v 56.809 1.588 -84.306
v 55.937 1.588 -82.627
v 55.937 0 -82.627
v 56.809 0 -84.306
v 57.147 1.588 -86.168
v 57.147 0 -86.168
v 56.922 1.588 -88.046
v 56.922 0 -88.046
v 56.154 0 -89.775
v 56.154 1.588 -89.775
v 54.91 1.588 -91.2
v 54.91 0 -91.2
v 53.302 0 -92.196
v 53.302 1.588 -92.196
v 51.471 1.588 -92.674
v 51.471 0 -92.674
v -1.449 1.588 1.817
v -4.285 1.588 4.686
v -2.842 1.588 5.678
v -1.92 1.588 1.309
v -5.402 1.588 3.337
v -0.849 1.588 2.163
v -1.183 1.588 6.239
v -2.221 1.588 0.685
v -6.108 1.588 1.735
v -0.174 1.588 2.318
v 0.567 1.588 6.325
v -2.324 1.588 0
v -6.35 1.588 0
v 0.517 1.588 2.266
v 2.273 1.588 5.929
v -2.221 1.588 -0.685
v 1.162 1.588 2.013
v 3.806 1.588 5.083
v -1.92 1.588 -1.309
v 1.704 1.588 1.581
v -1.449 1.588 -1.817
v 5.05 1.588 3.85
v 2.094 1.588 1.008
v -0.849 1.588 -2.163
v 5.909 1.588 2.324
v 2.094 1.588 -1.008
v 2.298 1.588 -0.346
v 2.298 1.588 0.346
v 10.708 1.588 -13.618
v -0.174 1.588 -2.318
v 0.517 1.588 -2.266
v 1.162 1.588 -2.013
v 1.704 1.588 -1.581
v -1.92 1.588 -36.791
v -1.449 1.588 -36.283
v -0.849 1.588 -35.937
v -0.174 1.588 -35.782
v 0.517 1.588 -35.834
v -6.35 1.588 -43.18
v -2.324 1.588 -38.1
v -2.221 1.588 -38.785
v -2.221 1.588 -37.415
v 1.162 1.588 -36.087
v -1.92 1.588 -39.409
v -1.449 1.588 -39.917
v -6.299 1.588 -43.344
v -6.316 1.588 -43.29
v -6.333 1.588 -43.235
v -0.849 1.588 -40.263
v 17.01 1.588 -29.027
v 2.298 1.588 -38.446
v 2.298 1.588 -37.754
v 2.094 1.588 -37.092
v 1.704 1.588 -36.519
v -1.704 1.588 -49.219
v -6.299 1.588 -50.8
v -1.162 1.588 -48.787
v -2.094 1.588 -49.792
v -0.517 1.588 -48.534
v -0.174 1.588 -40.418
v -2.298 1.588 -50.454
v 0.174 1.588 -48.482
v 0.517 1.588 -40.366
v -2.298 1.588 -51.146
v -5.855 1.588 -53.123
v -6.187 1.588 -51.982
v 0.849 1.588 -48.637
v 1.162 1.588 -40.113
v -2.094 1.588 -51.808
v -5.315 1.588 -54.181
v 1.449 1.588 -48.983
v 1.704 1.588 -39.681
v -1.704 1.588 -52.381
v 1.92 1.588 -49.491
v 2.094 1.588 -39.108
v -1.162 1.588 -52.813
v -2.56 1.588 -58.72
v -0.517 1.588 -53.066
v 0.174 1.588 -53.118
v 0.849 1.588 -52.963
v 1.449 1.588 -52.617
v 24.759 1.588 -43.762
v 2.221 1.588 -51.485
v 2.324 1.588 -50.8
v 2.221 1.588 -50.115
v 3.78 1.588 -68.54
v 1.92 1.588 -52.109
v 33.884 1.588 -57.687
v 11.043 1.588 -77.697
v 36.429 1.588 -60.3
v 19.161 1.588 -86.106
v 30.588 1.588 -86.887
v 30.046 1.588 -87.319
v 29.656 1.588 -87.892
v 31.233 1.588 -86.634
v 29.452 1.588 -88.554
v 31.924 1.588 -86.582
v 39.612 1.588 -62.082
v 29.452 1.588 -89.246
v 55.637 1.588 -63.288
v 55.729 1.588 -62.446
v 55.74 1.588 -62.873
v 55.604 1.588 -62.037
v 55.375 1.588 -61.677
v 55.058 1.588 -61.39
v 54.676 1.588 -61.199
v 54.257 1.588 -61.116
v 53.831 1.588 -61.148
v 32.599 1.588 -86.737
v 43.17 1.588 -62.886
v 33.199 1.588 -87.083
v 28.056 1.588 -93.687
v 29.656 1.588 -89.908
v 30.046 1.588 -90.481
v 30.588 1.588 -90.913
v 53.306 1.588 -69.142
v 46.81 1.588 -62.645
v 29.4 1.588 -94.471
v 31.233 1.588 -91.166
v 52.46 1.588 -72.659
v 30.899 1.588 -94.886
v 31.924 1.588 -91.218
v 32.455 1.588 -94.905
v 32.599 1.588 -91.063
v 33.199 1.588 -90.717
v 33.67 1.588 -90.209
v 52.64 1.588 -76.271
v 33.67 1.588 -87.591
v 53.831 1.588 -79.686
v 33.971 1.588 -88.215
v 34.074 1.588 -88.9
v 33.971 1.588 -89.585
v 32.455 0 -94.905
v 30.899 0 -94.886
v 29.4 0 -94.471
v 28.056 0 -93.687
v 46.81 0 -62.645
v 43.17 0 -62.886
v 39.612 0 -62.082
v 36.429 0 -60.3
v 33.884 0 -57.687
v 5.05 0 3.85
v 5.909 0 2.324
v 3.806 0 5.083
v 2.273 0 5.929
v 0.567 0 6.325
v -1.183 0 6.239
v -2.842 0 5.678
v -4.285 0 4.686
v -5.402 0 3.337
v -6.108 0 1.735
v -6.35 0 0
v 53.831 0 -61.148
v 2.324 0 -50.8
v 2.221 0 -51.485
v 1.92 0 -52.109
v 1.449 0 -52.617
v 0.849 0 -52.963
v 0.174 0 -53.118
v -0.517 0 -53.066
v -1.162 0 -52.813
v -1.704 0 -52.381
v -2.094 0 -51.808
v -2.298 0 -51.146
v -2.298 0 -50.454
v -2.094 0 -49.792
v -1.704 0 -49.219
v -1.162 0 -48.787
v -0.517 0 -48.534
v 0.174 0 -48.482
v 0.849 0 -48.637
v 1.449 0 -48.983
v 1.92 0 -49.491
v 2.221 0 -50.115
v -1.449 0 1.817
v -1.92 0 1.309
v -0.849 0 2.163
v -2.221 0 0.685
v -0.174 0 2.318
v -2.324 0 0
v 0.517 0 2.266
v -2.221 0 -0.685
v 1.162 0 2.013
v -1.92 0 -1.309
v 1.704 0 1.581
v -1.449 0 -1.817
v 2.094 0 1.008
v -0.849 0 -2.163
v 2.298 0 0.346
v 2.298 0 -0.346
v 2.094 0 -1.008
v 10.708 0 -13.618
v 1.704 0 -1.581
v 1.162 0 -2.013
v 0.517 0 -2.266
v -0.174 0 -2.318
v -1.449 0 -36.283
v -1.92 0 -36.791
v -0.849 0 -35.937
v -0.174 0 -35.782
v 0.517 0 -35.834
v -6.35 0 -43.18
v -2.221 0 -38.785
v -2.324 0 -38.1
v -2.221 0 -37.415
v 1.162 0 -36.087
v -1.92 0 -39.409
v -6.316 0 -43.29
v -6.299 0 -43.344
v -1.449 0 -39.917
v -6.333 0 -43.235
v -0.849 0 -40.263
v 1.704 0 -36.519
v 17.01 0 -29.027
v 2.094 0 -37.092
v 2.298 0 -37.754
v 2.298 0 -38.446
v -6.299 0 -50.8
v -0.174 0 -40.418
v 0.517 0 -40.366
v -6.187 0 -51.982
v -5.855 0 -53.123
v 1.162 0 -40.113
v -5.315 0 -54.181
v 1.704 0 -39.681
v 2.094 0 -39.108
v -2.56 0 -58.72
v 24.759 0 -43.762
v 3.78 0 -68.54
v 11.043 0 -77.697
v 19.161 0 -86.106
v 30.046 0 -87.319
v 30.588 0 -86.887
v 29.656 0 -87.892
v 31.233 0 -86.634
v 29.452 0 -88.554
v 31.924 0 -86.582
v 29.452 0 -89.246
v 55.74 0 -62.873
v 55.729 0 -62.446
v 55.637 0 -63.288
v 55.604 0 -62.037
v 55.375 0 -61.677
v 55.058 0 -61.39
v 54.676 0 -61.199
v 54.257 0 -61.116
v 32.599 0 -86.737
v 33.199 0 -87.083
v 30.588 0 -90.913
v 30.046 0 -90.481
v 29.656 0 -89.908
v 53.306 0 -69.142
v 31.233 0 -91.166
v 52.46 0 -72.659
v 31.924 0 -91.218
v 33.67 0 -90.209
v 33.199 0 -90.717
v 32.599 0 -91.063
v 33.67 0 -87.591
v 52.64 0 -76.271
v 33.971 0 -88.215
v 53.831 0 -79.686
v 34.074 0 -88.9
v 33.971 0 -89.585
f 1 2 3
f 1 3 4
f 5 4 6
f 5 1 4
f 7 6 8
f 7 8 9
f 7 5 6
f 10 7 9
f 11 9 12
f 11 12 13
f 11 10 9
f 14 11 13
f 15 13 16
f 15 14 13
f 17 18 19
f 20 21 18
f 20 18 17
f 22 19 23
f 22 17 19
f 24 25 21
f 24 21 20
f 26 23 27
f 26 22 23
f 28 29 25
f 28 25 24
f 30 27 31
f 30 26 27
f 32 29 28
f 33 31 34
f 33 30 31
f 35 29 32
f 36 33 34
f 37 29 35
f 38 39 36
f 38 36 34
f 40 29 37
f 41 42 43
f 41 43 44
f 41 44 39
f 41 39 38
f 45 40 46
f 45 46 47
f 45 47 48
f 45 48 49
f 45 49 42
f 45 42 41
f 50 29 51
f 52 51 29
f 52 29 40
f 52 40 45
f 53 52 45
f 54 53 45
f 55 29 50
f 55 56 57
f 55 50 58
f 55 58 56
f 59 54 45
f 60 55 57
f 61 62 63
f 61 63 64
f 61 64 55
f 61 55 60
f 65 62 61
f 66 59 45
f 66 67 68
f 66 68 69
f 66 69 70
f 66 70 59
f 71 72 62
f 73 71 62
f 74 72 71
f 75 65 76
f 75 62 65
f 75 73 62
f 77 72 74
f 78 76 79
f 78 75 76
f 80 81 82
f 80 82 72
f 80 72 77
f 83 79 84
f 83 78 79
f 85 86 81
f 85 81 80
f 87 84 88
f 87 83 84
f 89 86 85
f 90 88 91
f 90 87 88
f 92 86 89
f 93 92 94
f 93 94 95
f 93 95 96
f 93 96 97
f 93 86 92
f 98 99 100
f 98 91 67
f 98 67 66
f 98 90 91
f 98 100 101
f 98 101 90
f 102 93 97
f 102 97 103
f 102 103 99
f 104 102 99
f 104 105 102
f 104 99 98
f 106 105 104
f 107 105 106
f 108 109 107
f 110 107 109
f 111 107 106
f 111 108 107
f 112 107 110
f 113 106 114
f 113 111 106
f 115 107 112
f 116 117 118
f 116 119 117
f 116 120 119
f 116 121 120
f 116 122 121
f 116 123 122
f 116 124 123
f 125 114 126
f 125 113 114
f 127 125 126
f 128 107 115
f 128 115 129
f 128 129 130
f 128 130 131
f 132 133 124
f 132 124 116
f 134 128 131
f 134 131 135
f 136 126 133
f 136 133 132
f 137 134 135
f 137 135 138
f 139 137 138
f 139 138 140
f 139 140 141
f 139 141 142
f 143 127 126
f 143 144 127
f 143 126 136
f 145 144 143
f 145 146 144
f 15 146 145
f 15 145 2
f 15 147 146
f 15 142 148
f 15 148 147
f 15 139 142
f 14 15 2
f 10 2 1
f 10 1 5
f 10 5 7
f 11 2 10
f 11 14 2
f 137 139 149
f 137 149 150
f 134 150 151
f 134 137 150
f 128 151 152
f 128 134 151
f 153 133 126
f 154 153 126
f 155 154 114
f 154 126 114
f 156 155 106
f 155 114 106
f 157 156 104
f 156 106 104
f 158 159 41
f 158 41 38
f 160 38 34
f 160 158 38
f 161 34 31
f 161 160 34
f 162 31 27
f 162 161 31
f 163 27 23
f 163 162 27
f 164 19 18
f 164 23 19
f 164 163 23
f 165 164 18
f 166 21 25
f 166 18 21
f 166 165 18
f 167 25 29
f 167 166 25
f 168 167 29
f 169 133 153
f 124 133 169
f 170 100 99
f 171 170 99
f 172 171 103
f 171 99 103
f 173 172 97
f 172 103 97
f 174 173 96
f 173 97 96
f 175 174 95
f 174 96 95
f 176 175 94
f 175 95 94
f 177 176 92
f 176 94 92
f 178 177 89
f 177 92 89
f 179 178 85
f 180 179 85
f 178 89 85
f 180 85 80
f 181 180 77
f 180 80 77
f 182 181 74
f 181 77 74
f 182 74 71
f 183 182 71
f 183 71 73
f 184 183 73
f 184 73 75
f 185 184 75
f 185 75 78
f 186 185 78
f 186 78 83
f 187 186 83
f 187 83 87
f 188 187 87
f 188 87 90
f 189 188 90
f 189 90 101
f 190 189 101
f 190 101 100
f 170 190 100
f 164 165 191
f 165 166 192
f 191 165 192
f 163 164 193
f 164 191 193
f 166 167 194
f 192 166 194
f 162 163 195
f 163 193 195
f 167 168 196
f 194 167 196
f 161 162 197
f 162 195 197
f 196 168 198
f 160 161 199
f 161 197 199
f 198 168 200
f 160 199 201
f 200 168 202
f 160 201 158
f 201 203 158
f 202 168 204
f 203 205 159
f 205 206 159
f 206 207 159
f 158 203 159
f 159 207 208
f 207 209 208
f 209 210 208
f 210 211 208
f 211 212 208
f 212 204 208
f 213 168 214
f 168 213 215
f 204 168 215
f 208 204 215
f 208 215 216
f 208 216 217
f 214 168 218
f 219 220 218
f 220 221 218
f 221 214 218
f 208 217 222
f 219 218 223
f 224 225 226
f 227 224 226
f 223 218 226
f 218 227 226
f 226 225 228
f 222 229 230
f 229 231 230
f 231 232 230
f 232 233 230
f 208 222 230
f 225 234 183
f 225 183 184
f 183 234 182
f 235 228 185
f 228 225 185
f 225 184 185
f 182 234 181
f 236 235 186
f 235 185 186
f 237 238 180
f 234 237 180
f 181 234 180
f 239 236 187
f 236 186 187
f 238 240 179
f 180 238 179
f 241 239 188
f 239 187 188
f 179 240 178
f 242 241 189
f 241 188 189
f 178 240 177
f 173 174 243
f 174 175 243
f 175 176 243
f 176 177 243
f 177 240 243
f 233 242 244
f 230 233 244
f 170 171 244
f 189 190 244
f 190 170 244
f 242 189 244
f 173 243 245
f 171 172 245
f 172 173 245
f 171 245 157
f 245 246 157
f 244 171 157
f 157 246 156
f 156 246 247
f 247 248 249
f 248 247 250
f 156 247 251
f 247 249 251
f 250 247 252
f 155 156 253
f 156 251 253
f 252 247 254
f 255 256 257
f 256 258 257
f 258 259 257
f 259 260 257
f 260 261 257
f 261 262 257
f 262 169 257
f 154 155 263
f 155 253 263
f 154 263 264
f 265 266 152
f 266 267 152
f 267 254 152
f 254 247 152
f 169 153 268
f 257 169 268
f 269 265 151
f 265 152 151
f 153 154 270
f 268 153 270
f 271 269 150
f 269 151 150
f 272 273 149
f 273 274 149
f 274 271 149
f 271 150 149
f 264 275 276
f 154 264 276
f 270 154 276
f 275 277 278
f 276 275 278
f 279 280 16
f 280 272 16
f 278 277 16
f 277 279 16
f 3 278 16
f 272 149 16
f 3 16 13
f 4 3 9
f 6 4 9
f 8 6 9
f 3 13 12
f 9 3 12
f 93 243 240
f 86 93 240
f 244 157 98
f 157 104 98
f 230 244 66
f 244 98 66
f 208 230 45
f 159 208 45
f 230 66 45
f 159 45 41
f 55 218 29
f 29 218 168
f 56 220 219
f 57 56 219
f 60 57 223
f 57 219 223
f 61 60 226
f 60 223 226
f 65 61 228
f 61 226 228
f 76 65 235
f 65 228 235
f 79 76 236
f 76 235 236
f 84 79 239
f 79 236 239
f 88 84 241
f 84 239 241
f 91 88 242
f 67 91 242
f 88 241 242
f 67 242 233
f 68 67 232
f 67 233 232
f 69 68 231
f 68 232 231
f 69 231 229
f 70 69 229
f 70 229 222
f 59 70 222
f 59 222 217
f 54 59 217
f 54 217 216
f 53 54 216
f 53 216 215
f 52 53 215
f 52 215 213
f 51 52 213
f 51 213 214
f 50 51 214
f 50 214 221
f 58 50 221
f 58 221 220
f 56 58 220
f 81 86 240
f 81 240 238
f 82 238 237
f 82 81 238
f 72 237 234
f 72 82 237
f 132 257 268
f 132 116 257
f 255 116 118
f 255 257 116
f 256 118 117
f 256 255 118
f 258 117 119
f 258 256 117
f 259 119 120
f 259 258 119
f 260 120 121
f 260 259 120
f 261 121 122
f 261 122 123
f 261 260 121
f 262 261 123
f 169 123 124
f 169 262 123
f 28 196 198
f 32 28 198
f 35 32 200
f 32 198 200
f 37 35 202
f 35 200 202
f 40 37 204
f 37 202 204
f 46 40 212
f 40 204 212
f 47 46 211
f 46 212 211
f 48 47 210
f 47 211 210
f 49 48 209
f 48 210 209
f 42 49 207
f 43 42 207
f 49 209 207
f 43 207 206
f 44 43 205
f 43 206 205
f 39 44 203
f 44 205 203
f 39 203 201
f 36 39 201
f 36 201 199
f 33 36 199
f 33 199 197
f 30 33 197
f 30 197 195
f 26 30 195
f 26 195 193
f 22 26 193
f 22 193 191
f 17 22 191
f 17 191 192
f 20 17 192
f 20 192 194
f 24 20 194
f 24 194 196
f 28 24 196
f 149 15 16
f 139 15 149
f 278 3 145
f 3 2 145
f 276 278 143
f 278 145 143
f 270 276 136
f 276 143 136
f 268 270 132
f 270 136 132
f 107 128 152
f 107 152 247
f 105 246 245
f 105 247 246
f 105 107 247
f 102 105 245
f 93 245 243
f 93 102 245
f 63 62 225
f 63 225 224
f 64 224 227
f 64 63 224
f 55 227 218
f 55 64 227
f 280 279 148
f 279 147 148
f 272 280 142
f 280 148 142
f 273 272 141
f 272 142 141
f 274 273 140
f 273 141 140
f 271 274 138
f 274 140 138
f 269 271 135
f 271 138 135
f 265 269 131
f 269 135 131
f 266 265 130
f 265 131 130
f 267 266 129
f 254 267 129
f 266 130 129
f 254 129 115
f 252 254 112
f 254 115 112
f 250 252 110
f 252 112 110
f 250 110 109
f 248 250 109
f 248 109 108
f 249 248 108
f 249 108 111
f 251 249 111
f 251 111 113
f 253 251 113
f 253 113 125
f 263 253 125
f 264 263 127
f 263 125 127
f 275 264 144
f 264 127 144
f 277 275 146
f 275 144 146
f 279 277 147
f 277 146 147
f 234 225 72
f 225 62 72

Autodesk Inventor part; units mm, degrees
ref_plane "YZ Plane" through (0, 0, 0) normal (1, 0, 0) x (0, 1, 0)
ref_plane "XZ Plane" through (0, 0, 0) normal (0, 1, 0) x (-1, 0, 0)
ref_plane "XY Plane" through (0, 0, 0) normal (0, 0, 1) x (1, 0, 0)
sketch "Sketch1" plane through (0, 0, 0) normal (0, 1, 0) x (-1, 0, 0)
  circle A0 centre (0, 0) radius 2.3241
  line L0 (0, 0) -> (0, -38.1)
  circle A1 centre (0, -38.1) radius 2.3241
  line L1 (0, 0) -> (0, -38.1) construction
  line L2 (-6.35, 0) -> (-6.35, -38.1)
  line L3 (6.35, -38.1) -> (6.35, 0)
  arc A2 (6.35, 0) -> (-6.35, 0) centre (0, 0) ccw
  arc A3 (-6.35, -38.1) -> (6.35, -38.1) centre (0, -38.1) ccw
  line L4 (0, -38.1) -> (-15.9411, -38.1) construction
  line L5 (0, -31.75) -> (-15.9411, -31.75)
  line L6 (-15.9411, -44.45) -> (0, -44.45)
  arc A4 (0, -44.45) -> (0, -31.75) centre (0, -38.1) ccw
  arc A5 (-15.9411, -31.75) -> (-15.9411, -44.45) centre (-15.9411, -38.1) ccw
  line L7 (-5.9094, 2.3241) -> (-21.799, -35.6488)
  point P0 (0, -19.05)
  point P1 (-7.9706, -38.1)
  dimension "d0" = 4.6482
  dimension "d1" = 38.1
  dimension "d2" = 4.6482
  dimension "d3" = 12.7
extrude "Extrusion1" add sketch "Sketch1" along normal blind 1.5875
sketch "Sketch2" plane through (0, 1.5875, 0) normal (0, 1, 0) x (1, 0, 0)
  circle A0 centre (0, 38.1) radius 2.3241 projected
  line L0 (0, 38.1) -> (0, 31.75)
  line L1 (0, 31.75) -> (0, 92.71) construction
  line L2 (6.35, 38.1) -> (6.35, 86.36)
  line L3 (-6.35, 86.36) -> (-6.35, 38.1)
  arc A1 (-6.35, 38.1) -> (6.35, 38.1) centre (0, 38.1) ccw
  arc A2 (6.35, 86.36) -> (-6.35, 86.36) centre (0, 86.36) ccw
  line L4 (-6.35, 86.36) -> (57.15, 86.36) construction
  line L5 (0, 80.01) -> (50.8, 80.01)
  line L6 (50.8, 92.71) -> (0, 92.71)
  arc A3 (0, 92.71) -> (0, 80.01) centre (0, 86.36) ccw
  arc A4 (50.8, 80.01) -> (50.8, 92.71) centre (50.8, 86.36) ccw
  line L7 (-6.35, 38.1) -> (-6.35, 0) projected
  arc A5 (-6.35, 0) -> (5.9094, -2.3241) centre (0, 0) ccw projected
  line L8 (5.9094, -2.3241) -> (21.799, 35.6488) projected
  arc A6 (21.799, 35.6488) -> (15.9411, 44.45) centre (15.9411, 38.1) ccw projected
  line L9 (15.9411, 44.45) -> (0, 44.45) projected
  arc A7 (0, 44.45) -> (-6.35, 38.1) centre (0, 38.1) ccw projected
  circle A8 centre (0, 0) radius 2.3241 projected
  circle A9 centre (0, 38.1) radius 2.3241 projected
  line L10 (21.799, 35.6488) -> (55.9369, 82.6271)
  point P0 (0, 62.23)
  point P1 (25.4, 86.36)
  point P2 (0, 92.71)
  point P3 (6.35, 44.45)
  dimension "d6" = 6.35
  dimension "d7" = 60.96
  dimension "d10" = 63.5
extrude "Extrusion2" add sketch "Sketch2" against normal blind 1.5875 contours A1 A7 L9 L2 | L9 A7 L3 A3 L5 L2 | L2 L5 A4 L10 A6 L9 | L5 A3 A2 L2 | L2 A2 L6 A4 L5
sketch "Sketch3" plane through (0, 1.5875, 0) normal (0, 1, 0) x (1, 0, 0)
  arc A0 (55.9369, 82.6271) -> (50.8, 92.71) centre (50.8, 86.36) ccw projected
  line L0 (5.9094, -2.3241) -> (21.799, 35.6488) projected
  arc A1 (55.9369, 82.6271) -> (5.9094, -2.3241) centre (174.4039, -44.3439) ccw
  line L1 (21.799, 35.6488) -> (55.9369, 82.6271) projected
  point P0 (0, 0)
extrude "Extrusion3" cut sketch "Sketch3" against normal blind 1.5875
sketch "Sketch4" plane through (0, 1.5875, 0) normal (0, 1, 0) x (1, 0, 0)
  line L0 (0, 92.71) -> (50.8, 92.71) projected
  line L1 (-6.35, 86.36) -> (-6.35, 0) projected
  arc A0 (30.6634, 92.71) -> (-6.35, 43.18) centre (81.4918, 16.1314) ccw
  arc A1 (55.9369, 82.6271) -> (5.9094, -2.3241) centre (174.4039, -44.3439) ccw projected
  arc A2 (55.9369, 82.6271) -> (50.8, 92.71) centre (50.8, 86.36) ccw projected
  line L2 (50.8, 92.71) -> (0, 92.71) projected
  arc A3 (0, 92.71) -> (-6.35, 86.36) centre (0, 86.36) ccw projected
  line L3 (-6.35, 86.36) -> (-6.35, 0) projected
  arc A4 (-6.35, 0) -> (5.9094, -2.3241) centre (0, 0) ccw projected
  circle A5 centre (0, 0) radius 2.3241 projected
  circle A6 centre (0, 38.1) radius 2.3241 projected
extrude "Extrusion4" cut sketch "Sketch4" against normal blind 1.5875 contours L0 A0 L1 A3
sketch "Sketch5" plane through (0, 1.5875, 0) normal (0, 1, 0) x (1, 0, 0)
  point P0 (0, 0)
sketch "Sketch6" plane through (0, 1.5875, 0) normal (0, 1, 0) x (1, 0, 0)
  circle A0 centre (0, 38.1) radius 2.3241 projected
  line L0 (0, 38.1) -> (0, 50.8)
  circle A1 centre (0, 50.8) radius 2.3241
  point P0 (0, 0)
  dimension "d15" = 12.7
  dimension "d16" = 4.6482
extrude "Extrusion5" cut sketch "Sketch6" against normal blind 1.5875 contours A1
sketch "Sketch7" plane through (0, 1.5875, 0) normal (0, 1, 0) x (1, 0, 0)
  circle A0 centre (0, 50.8) radius 2.3241 projected
  circle A1 centre (0, 38.1) radius 2.3241
  arc A2 (6.2992, 38.1) -> (-6.2992, 38.1) centre (0, 38.1) ccw
  circle A3 centre (0, 38.1) radius 2.3241 projected
  line L0 (0, 50.8) -> (0, 88.9)
  arc A4 (35.4436, 84.1127) -> (5.3749, 48.0302) centre (101.5031, -1.5067) ccw
  arc A5 (31.75, 88.9) -> (0, 50.8) centre (101.5031, -1.5067) ccw
  arc A6 (31.75, 88.9) -> (0, 50.8) centre (101.5031, -1.5067) ccw construction
  arc A7 (28.0564, 93.6873) -> (-5.3749, 53.5698) centre (101.5031, -1.5067) ccw
  line L1 (0, 88.9) -> (31.75, 88.9)
  arc A8 (35.4436, 84.1127) -> (28.0564, 93.6873) centre (31.75, 88.9) ccw
  line L2 (0, 50.8) -> (6.2992, 50.8)
  circle A9 centre (0, 50.8) radius 2.3241
  arc A10 (6.2992, 50.8) -> (-6.2992, 50.8) centre (0, 50.8) ccw
  line L3 (-6.2992, 50.8) -> (0, 50.8)
  arc A11 (-5.3749, 53.5698) -> (5.3749, 48.0302) centre (0, 50.8) ccw
  line L4 (-6.2992, 38.1) -> (-6.2992, 50.8)
  line L5 (0, 38.1) -> (0, 50.8) construction
  line L6 (6.2992, 50.8) -> (6.2992, 38.1)
  circle A12 centre (0, 38.1) radius 2.3241
  circle A13 centre (31.75, 88.9) radius 2.3241
  point P0 (0, 0)
  point P1 (0, 44.45)
  point P2 (-4.5326, 55.1744)
  point P3 (6.2992, 49.7843)
  point P4 (0, 57.0992)
  point P5 (2.3241, 50.8)
  point P6 (0, 53.1241)
  dimension "d19" = 4.6482
  dimension "d40" = 4.6482
extrude "Extrusion6" add sketch "Sketch7" against normal blind 1.5875 contours L2 L6 A4 A11 L3 A0 | L3 A11 A7 A10 L0 A0 | A10 A5 A13 L1 A7 A8 A4 L6 | A10 L0 A7 L1 A13 A5 | A11 A4 L6 A2 L4 L3 | L3 A10 A7 A11 | A10 A7 L0 | A13 L1 A5 | A5 L1 A13
sketch "Sketch8" plane through (0, 1.5875, 0) normal (0, 1, 0) x (1, 0, 0)
  circle A0 centre (0, 50.8) radius 2.3241 projected
  circle A1 centre (0, 38.1) radius 2.3241 projected
  circle A2 centre (0, 0) radius 2.3241 projected
  arc A3 (36.4452, 92.71) -> (28.0564, 93.6873) centre (31.75, 88.9) ccw projected
  arc A4 (28.0564, 93.6873) -> (-4.5326, 55.1744) centre (101.5031, -1.5067) ccw projected
  arc A5 (-4.5326, 55.1744) -> (-6.2992, 50.8) centre (0, 50.8) ccw projected
  line L0 (-6.2992, 50.8) -> (-6.2992, 43.3444) projected
  arc A6 (-6.2992, 43.3444) -> (-6.35, 43.18) centre (81.4918, 16.1314) ccw projected
  line L1 (-6.35, 43.18) -> (-6.35, 0) projected
  arc A7 (-6.35, 0) -> (5.9094, -2.3241) centre (0, 0) ccw projected
  arc A8 (55.9369, 82.6271) -> (5.9094, -2.3241) centre (174.4039, -44.3439) ccw projected
  arc A9 (55.9369, 82.6271) -> (50.8, 92.71) centre (50.8, 86.36) ccw projected
  line L2 (50.8, 92.71) -> (36.4452, 92.71) projected
  arc A10 (55.9369, 82.6271) -> (50.8, 92.71) centre (50.8, 86.36) ccw projected
  line L3 (51.4711, 92.6744) -> (32.4545, 94.9054)
extrude "Extrusion7" add sketch "Sketch8" against normal blind 1.5875 contours A3 L3 A9 L2
sketch "Sketch11" plane through (0, 1.5875, 0) normal (0, 1, 0) x (1, 0, 0)
  arc A0 (55.9369, 82.6271) -> (5.9094, -2.3241) centre (174.4039, -44.3439) ccw projected
  line L0 (38.9499, 64.3219) -> (56.735, 60.5286)
  line L1 (56.735, 60.5286) -> (50.1783, 76.9989)
  circle A1 centre (0, 50.8) radius 2.3241 projected
  circle A2 centre (0, 38.1) radius 2.3241 projected
  circle A3 centre (0, 0) radius 2.3241 projected
  arc A4 (32.4545, 94.9054) -> (28.0564, 93.6873) centre (31.75, 88.9) ccw projected
  arc A5 (28.0564, 93.6873) -> (-4.5326, 55.1744) centre (101.5031, -1.5067) ccw projected
  arc A6 (-4.5326, 55.1744) -> (-6.2992, 50.8) centre (0, 50.8) ccw projected
  line L2 (-6.2992, 50.8) -> (-6.2992, 43.3444) projected
  arc A7 (-6.2992, 43.3444) -> (-6.35, 43.18) centre (81.4918, 16.1314) ccw projected
  line L3 (-6.35, 43.18) -> (-6.35, 0) projected
  arc A8 (-6.35, 0) -> (5.9094, -2.3241) centre (0, 0) ccw projected
  arc A9 (55.9369, 82.6271) -> (5.9094, -2.3241) centre (174.4039, -44.3439) ccw projected
  arc A10 (55.9369, 82.6271) -> (51.4711, 92.6744) centre (50.8, 86.36) ccw projected
  line L4 (51.4711, 92.6744) -> (32.4545, 94.9054) projected
extrude "Extrusion10" add sketch "Sketch11" against normal blind 1.5875 contours L1 L0 A0
fillet "Fillet4" radius 12.7 2 edges at (50.1783, 0.7937, -76.9989) (38.9499, 0.7937, -64.3219)
fillet "Fillet5" radius 1.5875 1 edges at (56.735, 0.7937, -60.5286)
extrude "Extrusion11" cut sketch "Sketch7" against normal blind 1.5875 contours A13 L1 A5 | A5 L1 A13
fillet "Fillet6" radius 127 1 edges at (-4.5326, 0.7937, -55.1744)
properties part number "Lady Brown Tabs"
